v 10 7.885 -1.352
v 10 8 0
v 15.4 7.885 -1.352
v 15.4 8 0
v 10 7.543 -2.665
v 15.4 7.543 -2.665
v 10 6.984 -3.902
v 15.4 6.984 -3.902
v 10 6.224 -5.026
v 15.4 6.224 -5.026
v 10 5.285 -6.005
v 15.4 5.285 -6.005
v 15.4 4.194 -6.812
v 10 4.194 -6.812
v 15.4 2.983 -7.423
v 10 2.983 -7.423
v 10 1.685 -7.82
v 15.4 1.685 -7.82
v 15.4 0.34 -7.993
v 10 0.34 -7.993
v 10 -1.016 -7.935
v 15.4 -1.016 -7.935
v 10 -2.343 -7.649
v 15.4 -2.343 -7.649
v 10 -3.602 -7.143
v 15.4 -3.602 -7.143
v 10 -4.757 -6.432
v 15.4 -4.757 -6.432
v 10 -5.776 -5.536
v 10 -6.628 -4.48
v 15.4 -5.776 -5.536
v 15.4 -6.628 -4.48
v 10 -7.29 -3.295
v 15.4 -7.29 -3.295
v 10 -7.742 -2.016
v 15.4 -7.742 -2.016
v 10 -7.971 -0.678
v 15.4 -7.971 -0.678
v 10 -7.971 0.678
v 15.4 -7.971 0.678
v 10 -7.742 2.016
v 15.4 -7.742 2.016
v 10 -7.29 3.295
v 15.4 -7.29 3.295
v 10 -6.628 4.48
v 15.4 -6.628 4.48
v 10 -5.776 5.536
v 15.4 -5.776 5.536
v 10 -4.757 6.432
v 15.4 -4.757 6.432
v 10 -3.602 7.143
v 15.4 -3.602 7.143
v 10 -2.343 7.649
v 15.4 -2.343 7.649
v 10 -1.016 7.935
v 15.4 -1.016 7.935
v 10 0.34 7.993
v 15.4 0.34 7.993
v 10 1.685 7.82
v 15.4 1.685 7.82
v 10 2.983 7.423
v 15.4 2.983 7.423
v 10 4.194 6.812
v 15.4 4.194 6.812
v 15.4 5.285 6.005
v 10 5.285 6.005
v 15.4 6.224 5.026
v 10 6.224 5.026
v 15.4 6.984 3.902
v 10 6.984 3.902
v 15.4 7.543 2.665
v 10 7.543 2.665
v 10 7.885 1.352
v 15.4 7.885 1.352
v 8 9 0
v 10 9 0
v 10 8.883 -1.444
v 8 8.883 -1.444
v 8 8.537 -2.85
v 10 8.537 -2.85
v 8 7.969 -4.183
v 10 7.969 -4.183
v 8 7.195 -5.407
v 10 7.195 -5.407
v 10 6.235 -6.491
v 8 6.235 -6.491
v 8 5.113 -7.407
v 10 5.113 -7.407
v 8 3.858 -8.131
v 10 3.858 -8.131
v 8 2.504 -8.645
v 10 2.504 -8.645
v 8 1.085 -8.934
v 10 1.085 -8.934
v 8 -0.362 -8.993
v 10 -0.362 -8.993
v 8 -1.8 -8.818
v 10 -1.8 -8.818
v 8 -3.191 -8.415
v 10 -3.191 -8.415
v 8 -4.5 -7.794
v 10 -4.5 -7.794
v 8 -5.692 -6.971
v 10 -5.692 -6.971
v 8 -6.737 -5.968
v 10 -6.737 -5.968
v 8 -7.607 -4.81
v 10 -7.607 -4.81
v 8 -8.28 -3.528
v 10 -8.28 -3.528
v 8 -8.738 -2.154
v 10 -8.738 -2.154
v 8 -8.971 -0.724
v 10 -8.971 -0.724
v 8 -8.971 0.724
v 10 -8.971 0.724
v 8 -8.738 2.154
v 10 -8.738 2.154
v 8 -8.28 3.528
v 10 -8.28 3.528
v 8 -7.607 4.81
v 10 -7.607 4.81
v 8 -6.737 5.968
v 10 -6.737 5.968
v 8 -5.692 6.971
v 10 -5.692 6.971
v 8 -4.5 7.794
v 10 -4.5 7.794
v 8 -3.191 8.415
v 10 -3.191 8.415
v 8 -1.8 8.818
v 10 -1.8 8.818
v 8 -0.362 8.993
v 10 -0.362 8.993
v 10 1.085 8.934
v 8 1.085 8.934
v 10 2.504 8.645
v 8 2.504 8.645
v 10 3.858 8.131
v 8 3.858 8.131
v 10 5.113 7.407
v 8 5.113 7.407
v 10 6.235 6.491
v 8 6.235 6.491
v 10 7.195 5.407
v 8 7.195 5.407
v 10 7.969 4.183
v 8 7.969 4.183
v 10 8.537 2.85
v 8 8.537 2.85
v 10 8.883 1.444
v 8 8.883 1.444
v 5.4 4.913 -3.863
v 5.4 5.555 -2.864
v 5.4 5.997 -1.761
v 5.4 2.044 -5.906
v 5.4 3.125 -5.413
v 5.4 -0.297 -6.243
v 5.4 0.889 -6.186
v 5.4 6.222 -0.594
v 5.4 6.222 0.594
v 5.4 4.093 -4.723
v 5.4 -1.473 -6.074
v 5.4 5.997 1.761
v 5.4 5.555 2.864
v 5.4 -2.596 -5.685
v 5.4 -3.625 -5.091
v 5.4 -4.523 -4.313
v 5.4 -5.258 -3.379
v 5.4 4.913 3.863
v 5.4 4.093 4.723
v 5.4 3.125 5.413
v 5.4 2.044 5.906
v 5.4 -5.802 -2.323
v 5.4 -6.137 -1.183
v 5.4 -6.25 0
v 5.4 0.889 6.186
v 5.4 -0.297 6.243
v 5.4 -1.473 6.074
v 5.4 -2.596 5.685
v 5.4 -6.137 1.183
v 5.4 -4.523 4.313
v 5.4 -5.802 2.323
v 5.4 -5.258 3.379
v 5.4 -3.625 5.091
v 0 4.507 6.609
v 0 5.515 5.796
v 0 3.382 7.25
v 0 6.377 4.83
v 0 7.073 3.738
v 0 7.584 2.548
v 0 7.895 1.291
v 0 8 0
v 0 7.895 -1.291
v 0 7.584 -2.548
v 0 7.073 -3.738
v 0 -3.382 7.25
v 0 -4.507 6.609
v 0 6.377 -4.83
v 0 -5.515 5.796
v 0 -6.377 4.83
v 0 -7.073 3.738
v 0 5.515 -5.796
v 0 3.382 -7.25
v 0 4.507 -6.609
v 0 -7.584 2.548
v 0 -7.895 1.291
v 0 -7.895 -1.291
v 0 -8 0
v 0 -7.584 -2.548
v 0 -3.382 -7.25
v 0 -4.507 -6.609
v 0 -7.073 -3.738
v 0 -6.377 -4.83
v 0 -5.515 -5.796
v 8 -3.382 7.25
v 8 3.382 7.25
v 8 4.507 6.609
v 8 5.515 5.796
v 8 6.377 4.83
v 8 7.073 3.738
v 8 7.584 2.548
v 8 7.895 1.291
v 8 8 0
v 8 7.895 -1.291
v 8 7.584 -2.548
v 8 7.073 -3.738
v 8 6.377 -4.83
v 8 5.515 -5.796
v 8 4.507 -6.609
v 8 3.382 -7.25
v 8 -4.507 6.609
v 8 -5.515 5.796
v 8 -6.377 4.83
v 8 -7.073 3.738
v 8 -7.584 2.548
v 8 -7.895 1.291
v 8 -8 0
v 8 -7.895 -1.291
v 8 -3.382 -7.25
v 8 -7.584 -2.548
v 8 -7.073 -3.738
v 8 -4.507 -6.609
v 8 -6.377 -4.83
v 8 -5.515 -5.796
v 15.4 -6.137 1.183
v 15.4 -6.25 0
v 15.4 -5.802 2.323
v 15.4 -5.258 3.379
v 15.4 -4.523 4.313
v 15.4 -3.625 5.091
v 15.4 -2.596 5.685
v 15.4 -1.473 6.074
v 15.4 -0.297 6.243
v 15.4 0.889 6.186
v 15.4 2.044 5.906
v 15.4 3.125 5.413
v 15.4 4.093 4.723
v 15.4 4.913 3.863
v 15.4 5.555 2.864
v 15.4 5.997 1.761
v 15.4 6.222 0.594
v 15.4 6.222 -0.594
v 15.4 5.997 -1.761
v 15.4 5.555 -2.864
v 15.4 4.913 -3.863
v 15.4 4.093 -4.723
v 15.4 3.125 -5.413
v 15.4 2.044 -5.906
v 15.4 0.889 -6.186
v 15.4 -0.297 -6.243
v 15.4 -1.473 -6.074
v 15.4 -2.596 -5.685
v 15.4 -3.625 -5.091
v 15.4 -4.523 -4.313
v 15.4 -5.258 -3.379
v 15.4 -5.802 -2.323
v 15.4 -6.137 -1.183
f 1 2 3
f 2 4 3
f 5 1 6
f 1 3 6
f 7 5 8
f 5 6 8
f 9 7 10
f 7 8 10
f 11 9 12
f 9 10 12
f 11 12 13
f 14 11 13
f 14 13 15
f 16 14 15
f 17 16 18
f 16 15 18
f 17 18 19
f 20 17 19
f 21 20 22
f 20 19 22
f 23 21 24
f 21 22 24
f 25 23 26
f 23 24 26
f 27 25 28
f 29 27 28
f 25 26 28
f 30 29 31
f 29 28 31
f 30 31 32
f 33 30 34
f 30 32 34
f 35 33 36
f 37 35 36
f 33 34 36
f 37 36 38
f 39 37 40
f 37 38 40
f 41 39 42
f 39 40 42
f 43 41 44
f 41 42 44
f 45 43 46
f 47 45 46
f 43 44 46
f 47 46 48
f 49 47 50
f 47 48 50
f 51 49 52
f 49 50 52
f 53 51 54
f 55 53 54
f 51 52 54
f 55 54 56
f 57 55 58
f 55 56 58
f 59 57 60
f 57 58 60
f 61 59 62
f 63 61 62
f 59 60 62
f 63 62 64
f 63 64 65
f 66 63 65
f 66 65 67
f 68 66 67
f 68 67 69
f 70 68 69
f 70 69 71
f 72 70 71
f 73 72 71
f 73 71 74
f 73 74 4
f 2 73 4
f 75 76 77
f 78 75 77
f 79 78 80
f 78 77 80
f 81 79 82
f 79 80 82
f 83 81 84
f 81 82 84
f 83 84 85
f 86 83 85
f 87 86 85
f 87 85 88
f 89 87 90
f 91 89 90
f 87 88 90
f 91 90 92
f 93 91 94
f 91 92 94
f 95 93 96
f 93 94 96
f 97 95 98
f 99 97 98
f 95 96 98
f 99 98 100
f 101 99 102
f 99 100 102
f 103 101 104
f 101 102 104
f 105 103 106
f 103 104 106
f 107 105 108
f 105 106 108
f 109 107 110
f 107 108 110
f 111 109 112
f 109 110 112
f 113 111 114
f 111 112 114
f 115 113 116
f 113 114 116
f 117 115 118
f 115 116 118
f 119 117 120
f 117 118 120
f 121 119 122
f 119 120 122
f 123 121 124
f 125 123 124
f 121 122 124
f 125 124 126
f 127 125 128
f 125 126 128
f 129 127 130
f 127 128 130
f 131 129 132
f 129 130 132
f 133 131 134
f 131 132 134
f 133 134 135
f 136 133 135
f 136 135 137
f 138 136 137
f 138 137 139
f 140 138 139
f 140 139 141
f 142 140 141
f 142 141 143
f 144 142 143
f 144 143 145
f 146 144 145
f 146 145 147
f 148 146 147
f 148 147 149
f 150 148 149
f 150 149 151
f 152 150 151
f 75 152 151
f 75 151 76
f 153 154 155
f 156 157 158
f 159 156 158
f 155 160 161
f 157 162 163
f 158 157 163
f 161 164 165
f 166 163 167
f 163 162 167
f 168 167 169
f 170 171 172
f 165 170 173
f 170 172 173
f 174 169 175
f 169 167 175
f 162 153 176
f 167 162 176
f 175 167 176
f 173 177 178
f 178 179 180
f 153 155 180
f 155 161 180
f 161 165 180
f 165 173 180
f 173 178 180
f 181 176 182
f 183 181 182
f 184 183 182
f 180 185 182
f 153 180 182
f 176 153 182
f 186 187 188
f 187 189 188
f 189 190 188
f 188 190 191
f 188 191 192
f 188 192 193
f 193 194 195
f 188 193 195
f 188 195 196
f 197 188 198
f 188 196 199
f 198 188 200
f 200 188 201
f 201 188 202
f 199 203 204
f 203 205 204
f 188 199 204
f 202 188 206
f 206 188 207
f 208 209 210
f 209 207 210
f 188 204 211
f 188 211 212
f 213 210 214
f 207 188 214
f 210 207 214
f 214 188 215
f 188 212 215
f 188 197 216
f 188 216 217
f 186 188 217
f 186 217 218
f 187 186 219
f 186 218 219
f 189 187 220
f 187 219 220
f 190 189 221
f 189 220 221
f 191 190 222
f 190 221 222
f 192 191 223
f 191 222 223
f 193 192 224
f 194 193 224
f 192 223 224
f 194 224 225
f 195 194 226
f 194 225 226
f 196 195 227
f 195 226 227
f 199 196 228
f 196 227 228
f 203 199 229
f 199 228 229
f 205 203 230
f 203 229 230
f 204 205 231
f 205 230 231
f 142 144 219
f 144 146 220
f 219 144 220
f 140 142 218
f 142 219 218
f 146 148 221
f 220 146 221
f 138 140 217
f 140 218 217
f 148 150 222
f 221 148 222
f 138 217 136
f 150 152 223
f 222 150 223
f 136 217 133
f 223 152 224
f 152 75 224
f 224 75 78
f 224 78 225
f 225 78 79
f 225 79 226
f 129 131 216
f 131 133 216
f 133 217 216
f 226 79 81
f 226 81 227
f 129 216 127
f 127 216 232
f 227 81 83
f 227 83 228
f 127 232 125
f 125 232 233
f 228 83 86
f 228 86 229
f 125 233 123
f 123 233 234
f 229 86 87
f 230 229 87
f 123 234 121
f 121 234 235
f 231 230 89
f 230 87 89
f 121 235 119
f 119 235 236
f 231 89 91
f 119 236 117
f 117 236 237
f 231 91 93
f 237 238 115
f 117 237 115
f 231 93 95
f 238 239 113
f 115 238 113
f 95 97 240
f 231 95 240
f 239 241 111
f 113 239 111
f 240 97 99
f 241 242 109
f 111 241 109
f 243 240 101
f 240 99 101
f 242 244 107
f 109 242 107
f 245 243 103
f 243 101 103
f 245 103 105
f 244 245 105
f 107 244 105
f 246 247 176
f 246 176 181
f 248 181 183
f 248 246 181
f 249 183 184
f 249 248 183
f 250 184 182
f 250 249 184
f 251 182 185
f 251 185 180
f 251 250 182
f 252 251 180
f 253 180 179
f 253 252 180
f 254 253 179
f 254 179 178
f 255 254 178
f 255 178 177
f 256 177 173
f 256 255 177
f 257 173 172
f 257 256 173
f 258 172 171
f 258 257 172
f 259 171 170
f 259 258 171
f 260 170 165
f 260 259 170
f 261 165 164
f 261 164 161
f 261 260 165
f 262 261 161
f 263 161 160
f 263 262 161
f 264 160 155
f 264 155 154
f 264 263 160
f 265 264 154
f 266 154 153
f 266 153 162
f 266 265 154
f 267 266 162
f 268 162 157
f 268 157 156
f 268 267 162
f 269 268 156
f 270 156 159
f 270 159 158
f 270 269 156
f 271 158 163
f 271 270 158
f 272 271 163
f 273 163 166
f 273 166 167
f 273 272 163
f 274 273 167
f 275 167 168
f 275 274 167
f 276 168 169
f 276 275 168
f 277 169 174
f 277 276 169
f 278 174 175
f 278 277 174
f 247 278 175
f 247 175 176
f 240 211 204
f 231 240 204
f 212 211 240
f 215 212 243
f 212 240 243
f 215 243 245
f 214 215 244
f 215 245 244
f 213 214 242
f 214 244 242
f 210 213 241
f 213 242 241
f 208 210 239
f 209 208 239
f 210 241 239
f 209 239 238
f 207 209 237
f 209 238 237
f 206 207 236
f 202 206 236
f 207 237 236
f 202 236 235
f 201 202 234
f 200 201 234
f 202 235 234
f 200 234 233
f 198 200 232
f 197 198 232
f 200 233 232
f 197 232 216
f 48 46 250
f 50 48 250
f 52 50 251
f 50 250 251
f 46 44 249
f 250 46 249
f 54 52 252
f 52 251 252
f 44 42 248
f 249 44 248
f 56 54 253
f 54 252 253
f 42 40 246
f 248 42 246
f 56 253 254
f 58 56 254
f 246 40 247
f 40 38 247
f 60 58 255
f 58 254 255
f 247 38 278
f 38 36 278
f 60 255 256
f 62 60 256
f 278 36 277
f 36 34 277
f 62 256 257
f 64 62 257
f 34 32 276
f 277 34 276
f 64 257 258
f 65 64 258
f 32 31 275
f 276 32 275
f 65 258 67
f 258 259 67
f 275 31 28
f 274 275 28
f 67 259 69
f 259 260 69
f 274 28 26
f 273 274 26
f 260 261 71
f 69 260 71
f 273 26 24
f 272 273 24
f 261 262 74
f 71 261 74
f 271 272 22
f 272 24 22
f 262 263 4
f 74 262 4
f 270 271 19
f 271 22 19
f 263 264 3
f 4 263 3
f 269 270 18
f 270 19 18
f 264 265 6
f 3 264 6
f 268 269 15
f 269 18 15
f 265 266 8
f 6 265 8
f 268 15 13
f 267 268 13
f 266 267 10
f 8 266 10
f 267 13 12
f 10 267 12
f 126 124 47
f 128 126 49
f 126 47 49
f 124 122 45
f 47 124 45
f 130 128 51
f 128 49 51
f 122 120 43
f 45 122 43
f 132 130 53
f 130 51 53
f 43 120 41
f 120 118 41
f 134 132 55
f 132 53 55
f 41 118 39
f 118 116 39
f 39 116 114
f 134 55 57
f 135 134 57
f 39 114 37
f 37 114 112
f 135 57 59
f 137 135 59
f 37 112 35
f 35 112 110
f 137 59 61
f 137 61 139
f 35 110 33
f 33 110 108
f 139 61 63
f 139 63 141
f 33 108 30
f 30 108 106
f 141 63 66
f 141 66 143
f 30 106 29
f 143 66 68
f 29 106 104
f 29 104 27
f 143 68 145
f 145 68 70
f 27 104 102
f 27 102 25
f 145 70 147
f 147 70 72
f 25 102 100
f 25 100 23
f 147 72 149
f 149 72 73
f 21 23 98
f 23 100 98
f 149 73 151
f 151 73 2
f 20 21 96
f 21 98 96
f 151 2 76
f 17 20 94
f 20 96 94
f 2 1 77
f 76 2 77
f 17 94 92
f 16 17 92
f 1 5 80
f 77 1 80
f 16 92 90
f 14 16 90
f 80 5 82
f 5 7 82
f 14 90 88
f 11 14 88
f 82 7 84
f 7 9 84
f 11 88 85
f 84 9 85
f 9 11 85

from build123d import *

# Parameters (mm, degrees)
SKETCH_4_R          = 6.25
CUT_EXTRUDE_1_DEPTH = 10
SKETCH_5_W          = 4.872533435
SKETCH_5_H          = 19.874807433
CUT_EXTRUDE_2_DEPTH = 8


with BuildPart() as part:
    # 草图3 → 旋转1 (revolve)
    with BuildSketch(Plane.XY):
        Polygon((0, 0), (0, 8), (8, 8), (8, 9), (10, 9), (10, 8), (15.4, 8), (15.4, 0), align=None)
    revolve(axis=Axis((15.4, 0, 0), (-1, 0, 0)))

    # 草图4 → 切除-拉伸1 (cut)
    with BuildSketch(Plane.ZY.offset(-15.4)):
        with Locations(Location((0, 0, 0), (0, 0, 270))):
            Circle(SKETCH_4_R)
    extrude(amount=CUT_EXTRUDE_1_DEPTH, mode=Mode.SUBTRACT)

    # 草图5 → 切除-拉伸2 (cut)
    with BuildSketch(Plane.ZY):
        with Locations((9.686266718, -0.512898256)):
            Rectangle(SKETCH_5_W, SKETCH_5_H)
        with Locations((-9.686266718, -0.512898256)):
            Rectangle(SKETCH_5_W, SKETCH_5_H)
    extrude(amount=-CUT_EXTRUDE_2_DEPTH, mode=Mode.SUBTRACT)


solid = part.part
